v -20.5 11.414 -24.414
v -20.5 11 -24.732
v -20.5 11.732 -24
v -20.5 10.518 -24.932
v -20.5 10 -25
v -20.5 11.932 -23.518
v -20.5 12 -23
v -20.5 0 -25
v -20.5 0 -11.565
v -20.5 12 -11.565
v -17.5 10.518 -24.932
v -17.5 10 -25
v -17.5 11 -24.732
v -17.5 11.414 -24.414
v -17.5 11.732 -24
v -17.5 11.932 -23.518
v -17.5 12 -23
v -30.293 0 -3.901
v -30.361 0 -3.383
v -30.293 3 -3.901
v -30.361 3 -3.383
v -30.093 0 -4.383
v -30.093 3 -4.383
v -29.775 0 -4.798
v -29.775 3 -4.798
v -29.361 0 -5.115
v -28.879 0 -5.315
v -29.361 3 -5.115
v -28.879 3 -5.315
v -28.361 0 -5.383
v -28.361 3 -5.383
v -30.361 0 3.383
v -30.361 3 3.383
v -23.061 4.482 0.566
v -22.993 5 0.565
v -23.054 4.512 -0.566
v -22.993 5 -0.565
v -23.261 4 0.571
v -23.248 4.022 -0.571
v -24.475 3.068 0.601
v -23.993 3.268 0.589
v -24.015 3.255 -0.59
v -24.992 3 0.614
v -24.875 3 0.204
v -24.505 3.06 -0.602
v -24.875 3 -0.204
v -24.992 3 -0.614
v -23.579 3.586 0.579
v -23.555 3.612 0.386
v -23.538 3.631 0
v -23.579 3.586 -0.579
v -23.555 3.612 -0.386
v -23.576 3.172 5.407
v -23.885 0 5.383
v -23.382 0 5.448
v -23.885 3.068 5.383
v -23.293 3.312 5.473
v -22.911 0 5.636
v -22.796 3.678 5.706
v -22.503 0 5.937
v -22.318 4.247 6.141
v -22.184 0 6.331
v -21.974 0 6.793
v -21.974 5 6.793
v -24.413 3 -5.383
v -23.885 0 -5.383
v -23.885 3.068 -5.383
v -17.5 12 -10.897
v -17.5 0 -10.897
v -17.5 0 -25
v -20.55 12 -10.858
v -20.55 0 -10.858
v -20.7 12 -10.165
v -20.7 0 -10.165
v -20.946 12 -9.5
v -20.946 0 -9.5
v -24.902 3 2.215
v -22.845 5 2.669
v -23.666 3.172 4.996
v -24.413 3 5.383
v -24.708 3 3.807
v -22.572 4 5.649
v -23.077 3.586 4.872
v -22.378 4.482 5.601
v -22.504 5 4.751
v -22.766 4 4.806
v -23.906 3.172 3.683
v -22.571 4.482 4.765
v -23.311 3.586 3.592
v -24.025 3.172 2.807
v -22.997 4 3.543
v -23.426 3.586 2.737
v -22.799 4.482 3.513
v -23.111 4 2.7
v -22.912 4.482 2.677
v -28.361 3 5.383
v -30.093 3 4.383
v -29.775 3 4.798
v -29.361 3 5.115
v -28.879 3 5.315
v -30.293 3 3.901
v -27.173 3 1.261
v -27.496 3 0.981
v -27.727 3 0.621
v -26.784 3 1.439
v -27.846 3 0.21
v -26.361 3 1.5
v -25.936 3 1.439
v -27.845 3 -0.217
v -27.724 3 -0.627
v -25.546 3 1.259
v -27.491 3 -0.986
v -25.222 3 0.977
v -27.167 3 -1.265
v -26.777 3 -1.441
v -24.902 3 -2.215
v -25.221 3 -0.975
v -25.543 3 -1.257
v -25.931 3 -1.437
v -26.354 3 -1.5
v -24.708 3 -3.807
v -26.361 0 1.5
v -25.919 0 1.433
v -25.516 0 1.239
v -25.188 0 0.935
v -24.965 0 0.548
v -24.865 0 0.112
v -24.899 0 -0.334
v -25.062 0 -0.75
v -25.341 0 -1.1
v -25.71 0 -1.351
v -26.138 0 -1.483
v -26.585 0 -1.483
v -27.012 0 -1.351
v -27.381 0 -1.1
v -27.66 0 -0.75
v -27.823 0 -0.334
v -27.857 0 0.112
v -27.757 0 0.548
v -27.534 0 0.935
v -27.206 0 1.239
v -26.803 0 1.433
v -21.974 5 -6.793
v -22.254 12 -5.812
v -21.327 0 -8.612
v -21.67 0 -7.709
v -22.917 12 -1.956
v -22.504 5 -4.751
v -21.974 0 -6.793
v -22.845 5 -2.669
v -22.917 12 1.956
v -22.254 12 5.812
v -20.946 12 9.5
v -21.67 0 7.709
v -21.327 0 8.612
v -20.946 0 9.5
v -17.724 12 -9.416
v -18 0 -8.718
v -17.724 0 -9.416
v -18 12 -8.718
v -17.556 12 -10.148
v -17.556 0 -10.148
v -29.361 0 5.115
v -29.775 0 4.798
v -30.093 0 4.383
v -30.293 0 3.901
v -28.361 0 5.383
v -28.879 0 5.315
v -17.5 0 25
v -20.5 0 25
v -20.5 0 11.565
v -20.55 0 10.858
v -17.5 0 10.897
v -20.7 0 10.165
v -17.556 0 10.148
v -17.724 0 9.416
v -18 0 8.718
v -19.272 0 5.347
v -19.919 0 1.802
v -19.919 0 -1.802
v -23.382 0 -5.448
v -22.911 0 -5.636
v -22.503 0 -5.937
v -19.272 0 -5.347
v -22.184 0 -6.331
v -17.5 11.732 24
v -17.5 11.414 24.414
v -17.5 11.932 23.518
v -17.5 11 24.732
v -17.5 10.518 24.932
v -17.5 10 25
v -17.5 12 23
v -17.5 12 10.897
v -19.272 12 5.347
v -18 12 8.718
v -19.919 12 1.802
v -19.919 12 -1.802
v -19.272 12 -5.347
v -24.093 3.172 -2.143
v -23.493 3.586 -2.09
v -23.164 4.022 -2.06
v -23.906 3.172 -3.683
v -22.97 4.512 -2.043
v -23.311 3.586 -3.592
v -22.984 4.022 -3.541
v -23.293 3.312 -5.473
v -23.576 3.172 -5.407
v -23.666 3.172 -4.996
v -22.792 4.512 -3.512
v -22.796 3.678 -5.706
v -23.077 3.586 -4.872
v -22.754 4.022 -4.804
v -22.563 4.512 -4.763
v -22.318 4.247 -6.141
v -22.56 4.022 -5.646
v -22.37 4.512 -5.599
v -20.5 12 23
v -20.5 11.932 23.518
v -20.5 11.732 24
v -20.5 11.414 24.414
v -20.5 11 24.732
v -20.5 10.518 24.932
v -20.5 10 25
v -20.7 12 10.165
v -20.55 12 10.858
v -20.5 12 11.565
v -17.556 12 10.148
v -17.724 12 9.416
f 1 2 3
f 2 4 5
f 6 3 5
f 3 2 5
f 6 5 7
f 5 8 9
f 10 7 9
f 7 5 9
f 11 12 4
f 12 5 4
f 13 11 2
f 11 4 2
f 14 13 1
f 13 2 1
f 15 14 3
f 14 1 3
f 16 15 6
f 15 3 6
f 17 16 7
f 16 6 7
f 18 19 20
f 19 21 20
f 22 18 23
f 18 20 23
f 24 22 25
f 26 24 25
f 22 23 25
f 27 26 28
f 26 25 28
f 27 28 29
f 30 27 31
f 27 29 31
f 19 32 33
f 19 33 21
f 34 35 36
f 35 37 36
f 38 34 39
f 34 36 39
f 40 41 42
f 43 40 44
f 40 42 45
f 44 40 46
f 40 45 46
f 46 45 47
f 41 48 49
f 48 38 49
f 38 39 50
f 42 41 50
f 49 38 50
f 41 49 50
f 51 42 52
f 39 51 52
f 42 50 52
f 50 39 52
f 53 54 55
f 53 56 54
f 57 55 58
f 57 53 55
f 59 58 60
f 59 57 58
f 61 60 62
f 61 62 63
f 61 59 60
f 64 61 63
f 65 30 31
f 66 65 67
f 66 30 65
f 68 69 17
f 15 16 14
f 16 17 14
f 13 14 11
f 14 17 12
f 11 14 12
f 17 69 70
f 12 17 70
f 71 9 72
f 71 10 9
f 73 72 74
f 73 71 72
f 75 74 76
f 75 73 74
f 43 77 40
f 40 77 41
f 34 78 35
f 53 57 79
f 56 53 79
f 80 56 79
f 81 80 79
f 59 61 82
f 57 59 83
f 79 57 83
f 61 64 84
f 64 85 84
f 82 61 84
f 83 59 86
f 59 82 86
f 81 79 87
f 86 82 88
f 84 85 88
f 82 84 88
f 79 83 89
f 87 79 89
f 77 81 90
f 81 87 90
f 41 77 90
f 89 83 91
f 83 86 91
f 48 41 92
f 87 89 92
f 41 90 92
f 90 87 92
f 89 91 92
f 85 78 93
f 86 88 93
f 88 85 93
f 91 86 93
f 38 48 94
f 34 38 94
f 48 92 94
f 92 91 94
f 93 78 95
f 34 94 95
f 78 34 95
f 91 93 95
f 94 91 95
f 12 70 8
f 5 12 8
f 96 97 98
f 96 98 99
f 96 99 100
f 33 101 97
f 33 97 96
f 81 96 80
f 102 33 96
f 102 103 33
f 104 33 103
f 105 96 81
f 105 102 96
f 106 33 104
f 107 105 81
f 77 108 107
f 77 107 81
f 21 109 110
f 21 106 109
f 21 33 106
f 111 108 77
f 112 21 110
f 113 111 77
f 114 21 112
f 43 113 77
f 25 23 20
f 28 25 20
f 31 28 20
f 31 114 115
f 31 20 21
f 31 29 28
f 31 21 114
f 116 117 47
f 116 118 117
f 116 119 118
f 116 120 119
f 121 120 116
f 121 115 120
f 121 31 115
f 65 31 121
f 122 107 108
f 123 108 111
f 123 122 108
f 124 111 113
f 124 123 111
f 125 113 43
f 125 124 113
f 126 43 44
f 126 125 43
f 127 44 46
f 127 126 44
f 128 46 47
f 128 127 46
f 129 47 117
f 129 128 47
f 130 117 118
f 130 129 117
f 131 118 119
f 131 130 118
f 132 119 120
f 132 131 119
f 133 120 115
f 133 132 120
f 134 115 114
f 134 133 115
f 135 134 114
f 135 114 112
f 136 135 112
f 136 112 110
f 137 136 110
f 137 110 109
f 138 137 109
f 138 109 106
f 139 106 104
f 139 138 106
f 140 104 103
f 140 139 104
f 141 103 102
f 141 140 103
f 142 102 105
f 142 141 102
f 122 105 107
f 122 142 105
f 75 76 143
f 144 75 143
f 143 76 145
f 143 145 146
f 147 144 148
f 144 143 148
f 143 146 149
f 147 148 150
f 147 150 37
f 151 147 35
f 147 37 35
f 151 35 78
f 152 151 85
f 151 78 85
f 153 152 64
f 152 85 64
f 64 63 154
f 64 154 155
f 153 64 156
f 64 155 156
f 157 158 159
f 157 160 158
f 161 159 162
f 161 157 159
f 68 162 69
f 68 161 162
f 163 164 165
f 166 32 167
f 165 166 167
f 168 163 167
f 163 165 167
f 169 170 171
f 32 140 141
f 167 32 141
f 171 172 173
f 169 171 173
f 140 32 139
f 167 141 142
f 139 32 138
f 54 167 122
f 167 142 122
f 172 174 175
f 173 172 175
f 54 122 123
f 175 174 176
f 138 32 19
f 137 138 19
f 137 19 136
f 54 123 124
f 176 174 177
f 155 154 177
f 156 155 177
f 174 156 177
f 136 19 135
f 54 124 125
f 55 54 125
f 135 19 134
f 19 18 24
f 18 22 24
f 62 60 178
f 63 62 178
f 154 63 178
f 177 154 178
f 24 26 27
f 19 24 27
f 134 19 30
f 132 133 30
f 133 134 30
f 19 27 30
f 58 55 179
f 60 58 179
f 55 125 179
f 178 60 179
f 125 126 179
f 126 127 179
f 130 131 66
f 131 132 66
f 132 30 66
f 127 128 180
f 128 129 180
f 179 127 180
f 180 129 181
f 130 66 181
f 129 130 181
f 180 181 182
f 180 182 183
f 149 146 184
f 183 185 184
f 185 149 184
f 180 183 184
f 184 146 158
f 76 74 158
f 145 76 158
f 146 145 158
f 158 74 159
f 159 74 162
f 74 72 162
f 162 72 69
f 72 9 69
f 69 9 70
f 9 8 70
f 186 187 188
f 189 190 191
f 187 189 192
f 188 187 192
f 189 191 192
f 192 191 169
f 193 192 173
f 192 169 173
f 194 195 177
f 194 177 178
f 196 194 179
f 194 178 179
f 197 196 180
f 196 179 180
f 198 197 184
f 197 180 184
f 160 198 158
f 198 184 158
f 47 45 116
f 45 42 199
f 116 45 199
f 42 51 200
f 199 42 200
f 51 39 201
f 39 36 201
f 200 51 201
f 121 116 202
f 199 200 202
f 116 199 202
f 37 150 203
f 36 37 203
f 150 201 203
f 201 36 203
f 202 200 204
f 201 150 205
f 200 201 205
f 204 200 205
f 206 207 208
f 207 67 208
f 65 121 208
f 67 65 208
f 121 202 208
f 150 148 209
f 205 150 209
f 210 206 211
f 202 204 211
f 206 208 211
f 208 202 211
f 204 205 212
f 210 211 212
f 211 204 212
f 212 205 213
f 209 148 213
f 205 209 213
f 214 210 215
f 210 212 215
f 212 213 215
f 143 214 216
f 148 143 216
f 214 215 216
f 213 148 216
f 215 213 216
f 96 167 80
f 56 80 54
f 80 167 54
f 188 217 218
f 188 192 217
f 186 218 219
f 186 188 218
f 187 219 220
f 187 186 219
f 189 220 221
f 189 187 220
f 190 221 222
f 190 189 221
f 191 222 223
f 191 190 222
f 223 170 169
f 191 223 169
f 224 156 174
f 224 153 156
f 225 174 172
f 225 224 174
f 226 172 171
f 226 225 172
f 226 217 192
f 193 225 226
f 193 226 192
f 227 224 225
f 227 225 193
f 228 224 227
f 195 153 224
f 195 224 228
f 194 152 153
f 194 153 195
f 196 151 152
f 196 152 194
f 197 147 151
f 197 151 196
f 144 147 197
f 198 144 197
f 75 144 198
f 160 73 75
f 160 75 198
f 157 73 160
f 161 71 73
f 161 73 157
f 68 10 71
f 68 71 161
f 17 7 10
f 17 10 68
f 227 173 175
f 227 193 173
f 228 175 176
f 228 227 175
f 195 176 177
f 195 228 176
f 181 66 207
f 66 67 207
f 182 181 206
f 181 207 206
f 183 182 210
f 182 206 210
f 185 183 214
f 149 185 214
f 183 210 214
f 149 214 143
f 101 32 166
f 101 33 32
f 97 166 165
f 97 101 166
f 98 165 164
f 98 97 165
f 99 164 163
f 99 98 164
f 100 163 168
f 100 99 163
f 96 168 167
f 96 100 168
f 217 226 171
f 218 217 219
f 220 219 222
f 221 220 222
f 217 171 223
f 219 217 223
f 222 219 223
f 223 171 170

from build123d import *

# Parameters (mm, degrees)
BOSS_EXTRUDE2_DEPTH = 12
FILLET2_R           = 5
FILLET3_R           = 2
SKETCH2_W           = 8
SKETCH2_H           = 10.766845602
SKETCH2_R           = 1.5
BOSS_EXTRUDE3_DEPTH = 3
FILLET4_R           = 2


with BuildPart() as part:
    # Sketch1 → Boss-Extrude2 (new body)
    with BuildSketch(Plane(origin=(0, 0, 0), x_dir=(1, 0, 0), z_dir=(0, 1, 0))):
        with BuildLine():
            Line((-17.5, 25), (-20.5, 25))
            Line((-20.5, 25), (-20.5, 10.428326807))
            ThreePointArc((-20.5, 10.428326807), (-19.132553248, 12.765007099), (-17.5, 14.924811557))
            Line((-17.5, 14.924811557), (-17.5, 25))
        make_face()
        with BuildLine():
            ThreePointArc((-17.5, 14.924811557), (-19.132553248, 12.765007099), (-20.5, 10.428326807))
            Line((-20.5, 10.428326807), (-20.5, -10.428326807))
            ThreePointArc((-20.5, -10.428326807), (-19.132553248, -12.765007099), (-17.5, -14.924811557))
            Line((-17.5, -14.924811557), (-17.5, -9.682458366))
            ThreePointArc((-17.5, -9.682458366), (-20, 0), (-17.5, 9.682458366))
            Line((-17.5, 9.682458366), (-17.5, 14.924811557))
        make_face()
        with BuildLine():
            Line((-20.5, -10.428326807), (-20.5, 10.428326807))
            ThreePointArc((-20.5, 10.428326807), (-23, 0), (-20.5, -10.428326807))
        make_face()
        with BuildLine():
            ThreePointArc((-17.5, -14.924811557), (-19.132553248, -12.765007099), (-20.5, -10.428326807))
            Line((-20.5, -10.428326807), (-20.5, -25))
            Line((-20.5, -25), (-17.5, -25))
            Line((-17.5, -25), (-17.5, -14.924811557))
        make_face()
    extrude(amount=BOSS_EXTRUDE2_DEPTH)

    # Fillet2
    fillet2_edges = [part.edges().sort_by_distance(p)[0] for p in [
        (-17.5, 6, -9.682458366),
        (-17.5, 6, 9.682458366),
        (-20.5, 6, 10.428326807),
        (-20.5, 6, -10.428326807),
    ]]
    fillet(fillet2_edges, radius=FILLET2_R)

    # Fillet3
    fillet3_edges = [part.edges().sort_by_distance(p)[0] for p in [
        (-19, 12, 25),
        (-19, 12, -25),
    ]]
    fillet(fillet3_edges, radius=FILLET3_R)

    # Sketch2 → Boss-Extrude3 (add)
    with BuildSketch(Plane(origin=(0, 0, 0), x_dir=(1, 0, 0), z_dir=(0, 1, 0))):
        with Locations((-26.361099234, 0)):
            Rectangle(SKETCH2_W, SKETCH2_H)
        with Locations(Location((-26.361099234, 0, 0), (0, 0, 270))):
            Circle(SKETCH2_R, mode=Mode.SUBTRACT)
    extrude(amount=BOSS_EXTRUDE3_DEPTH)

    # Fillet4
    fillet4_edges = [part.edges().sort_by_distance(p)[0] for p in [
        (-23, 3, 0),
        (-30.361099234, 1.5, -5.383422801),
        (-30.361099234, 1.5, 5.383422801),
        (-22.361099234, 1.5, 5.383422801),
        (-22.361099234, 1.5, -5.383422801),
    ]]
    fillet(fillet4_edges, radius=FILLET4_R)


solid = part.part
